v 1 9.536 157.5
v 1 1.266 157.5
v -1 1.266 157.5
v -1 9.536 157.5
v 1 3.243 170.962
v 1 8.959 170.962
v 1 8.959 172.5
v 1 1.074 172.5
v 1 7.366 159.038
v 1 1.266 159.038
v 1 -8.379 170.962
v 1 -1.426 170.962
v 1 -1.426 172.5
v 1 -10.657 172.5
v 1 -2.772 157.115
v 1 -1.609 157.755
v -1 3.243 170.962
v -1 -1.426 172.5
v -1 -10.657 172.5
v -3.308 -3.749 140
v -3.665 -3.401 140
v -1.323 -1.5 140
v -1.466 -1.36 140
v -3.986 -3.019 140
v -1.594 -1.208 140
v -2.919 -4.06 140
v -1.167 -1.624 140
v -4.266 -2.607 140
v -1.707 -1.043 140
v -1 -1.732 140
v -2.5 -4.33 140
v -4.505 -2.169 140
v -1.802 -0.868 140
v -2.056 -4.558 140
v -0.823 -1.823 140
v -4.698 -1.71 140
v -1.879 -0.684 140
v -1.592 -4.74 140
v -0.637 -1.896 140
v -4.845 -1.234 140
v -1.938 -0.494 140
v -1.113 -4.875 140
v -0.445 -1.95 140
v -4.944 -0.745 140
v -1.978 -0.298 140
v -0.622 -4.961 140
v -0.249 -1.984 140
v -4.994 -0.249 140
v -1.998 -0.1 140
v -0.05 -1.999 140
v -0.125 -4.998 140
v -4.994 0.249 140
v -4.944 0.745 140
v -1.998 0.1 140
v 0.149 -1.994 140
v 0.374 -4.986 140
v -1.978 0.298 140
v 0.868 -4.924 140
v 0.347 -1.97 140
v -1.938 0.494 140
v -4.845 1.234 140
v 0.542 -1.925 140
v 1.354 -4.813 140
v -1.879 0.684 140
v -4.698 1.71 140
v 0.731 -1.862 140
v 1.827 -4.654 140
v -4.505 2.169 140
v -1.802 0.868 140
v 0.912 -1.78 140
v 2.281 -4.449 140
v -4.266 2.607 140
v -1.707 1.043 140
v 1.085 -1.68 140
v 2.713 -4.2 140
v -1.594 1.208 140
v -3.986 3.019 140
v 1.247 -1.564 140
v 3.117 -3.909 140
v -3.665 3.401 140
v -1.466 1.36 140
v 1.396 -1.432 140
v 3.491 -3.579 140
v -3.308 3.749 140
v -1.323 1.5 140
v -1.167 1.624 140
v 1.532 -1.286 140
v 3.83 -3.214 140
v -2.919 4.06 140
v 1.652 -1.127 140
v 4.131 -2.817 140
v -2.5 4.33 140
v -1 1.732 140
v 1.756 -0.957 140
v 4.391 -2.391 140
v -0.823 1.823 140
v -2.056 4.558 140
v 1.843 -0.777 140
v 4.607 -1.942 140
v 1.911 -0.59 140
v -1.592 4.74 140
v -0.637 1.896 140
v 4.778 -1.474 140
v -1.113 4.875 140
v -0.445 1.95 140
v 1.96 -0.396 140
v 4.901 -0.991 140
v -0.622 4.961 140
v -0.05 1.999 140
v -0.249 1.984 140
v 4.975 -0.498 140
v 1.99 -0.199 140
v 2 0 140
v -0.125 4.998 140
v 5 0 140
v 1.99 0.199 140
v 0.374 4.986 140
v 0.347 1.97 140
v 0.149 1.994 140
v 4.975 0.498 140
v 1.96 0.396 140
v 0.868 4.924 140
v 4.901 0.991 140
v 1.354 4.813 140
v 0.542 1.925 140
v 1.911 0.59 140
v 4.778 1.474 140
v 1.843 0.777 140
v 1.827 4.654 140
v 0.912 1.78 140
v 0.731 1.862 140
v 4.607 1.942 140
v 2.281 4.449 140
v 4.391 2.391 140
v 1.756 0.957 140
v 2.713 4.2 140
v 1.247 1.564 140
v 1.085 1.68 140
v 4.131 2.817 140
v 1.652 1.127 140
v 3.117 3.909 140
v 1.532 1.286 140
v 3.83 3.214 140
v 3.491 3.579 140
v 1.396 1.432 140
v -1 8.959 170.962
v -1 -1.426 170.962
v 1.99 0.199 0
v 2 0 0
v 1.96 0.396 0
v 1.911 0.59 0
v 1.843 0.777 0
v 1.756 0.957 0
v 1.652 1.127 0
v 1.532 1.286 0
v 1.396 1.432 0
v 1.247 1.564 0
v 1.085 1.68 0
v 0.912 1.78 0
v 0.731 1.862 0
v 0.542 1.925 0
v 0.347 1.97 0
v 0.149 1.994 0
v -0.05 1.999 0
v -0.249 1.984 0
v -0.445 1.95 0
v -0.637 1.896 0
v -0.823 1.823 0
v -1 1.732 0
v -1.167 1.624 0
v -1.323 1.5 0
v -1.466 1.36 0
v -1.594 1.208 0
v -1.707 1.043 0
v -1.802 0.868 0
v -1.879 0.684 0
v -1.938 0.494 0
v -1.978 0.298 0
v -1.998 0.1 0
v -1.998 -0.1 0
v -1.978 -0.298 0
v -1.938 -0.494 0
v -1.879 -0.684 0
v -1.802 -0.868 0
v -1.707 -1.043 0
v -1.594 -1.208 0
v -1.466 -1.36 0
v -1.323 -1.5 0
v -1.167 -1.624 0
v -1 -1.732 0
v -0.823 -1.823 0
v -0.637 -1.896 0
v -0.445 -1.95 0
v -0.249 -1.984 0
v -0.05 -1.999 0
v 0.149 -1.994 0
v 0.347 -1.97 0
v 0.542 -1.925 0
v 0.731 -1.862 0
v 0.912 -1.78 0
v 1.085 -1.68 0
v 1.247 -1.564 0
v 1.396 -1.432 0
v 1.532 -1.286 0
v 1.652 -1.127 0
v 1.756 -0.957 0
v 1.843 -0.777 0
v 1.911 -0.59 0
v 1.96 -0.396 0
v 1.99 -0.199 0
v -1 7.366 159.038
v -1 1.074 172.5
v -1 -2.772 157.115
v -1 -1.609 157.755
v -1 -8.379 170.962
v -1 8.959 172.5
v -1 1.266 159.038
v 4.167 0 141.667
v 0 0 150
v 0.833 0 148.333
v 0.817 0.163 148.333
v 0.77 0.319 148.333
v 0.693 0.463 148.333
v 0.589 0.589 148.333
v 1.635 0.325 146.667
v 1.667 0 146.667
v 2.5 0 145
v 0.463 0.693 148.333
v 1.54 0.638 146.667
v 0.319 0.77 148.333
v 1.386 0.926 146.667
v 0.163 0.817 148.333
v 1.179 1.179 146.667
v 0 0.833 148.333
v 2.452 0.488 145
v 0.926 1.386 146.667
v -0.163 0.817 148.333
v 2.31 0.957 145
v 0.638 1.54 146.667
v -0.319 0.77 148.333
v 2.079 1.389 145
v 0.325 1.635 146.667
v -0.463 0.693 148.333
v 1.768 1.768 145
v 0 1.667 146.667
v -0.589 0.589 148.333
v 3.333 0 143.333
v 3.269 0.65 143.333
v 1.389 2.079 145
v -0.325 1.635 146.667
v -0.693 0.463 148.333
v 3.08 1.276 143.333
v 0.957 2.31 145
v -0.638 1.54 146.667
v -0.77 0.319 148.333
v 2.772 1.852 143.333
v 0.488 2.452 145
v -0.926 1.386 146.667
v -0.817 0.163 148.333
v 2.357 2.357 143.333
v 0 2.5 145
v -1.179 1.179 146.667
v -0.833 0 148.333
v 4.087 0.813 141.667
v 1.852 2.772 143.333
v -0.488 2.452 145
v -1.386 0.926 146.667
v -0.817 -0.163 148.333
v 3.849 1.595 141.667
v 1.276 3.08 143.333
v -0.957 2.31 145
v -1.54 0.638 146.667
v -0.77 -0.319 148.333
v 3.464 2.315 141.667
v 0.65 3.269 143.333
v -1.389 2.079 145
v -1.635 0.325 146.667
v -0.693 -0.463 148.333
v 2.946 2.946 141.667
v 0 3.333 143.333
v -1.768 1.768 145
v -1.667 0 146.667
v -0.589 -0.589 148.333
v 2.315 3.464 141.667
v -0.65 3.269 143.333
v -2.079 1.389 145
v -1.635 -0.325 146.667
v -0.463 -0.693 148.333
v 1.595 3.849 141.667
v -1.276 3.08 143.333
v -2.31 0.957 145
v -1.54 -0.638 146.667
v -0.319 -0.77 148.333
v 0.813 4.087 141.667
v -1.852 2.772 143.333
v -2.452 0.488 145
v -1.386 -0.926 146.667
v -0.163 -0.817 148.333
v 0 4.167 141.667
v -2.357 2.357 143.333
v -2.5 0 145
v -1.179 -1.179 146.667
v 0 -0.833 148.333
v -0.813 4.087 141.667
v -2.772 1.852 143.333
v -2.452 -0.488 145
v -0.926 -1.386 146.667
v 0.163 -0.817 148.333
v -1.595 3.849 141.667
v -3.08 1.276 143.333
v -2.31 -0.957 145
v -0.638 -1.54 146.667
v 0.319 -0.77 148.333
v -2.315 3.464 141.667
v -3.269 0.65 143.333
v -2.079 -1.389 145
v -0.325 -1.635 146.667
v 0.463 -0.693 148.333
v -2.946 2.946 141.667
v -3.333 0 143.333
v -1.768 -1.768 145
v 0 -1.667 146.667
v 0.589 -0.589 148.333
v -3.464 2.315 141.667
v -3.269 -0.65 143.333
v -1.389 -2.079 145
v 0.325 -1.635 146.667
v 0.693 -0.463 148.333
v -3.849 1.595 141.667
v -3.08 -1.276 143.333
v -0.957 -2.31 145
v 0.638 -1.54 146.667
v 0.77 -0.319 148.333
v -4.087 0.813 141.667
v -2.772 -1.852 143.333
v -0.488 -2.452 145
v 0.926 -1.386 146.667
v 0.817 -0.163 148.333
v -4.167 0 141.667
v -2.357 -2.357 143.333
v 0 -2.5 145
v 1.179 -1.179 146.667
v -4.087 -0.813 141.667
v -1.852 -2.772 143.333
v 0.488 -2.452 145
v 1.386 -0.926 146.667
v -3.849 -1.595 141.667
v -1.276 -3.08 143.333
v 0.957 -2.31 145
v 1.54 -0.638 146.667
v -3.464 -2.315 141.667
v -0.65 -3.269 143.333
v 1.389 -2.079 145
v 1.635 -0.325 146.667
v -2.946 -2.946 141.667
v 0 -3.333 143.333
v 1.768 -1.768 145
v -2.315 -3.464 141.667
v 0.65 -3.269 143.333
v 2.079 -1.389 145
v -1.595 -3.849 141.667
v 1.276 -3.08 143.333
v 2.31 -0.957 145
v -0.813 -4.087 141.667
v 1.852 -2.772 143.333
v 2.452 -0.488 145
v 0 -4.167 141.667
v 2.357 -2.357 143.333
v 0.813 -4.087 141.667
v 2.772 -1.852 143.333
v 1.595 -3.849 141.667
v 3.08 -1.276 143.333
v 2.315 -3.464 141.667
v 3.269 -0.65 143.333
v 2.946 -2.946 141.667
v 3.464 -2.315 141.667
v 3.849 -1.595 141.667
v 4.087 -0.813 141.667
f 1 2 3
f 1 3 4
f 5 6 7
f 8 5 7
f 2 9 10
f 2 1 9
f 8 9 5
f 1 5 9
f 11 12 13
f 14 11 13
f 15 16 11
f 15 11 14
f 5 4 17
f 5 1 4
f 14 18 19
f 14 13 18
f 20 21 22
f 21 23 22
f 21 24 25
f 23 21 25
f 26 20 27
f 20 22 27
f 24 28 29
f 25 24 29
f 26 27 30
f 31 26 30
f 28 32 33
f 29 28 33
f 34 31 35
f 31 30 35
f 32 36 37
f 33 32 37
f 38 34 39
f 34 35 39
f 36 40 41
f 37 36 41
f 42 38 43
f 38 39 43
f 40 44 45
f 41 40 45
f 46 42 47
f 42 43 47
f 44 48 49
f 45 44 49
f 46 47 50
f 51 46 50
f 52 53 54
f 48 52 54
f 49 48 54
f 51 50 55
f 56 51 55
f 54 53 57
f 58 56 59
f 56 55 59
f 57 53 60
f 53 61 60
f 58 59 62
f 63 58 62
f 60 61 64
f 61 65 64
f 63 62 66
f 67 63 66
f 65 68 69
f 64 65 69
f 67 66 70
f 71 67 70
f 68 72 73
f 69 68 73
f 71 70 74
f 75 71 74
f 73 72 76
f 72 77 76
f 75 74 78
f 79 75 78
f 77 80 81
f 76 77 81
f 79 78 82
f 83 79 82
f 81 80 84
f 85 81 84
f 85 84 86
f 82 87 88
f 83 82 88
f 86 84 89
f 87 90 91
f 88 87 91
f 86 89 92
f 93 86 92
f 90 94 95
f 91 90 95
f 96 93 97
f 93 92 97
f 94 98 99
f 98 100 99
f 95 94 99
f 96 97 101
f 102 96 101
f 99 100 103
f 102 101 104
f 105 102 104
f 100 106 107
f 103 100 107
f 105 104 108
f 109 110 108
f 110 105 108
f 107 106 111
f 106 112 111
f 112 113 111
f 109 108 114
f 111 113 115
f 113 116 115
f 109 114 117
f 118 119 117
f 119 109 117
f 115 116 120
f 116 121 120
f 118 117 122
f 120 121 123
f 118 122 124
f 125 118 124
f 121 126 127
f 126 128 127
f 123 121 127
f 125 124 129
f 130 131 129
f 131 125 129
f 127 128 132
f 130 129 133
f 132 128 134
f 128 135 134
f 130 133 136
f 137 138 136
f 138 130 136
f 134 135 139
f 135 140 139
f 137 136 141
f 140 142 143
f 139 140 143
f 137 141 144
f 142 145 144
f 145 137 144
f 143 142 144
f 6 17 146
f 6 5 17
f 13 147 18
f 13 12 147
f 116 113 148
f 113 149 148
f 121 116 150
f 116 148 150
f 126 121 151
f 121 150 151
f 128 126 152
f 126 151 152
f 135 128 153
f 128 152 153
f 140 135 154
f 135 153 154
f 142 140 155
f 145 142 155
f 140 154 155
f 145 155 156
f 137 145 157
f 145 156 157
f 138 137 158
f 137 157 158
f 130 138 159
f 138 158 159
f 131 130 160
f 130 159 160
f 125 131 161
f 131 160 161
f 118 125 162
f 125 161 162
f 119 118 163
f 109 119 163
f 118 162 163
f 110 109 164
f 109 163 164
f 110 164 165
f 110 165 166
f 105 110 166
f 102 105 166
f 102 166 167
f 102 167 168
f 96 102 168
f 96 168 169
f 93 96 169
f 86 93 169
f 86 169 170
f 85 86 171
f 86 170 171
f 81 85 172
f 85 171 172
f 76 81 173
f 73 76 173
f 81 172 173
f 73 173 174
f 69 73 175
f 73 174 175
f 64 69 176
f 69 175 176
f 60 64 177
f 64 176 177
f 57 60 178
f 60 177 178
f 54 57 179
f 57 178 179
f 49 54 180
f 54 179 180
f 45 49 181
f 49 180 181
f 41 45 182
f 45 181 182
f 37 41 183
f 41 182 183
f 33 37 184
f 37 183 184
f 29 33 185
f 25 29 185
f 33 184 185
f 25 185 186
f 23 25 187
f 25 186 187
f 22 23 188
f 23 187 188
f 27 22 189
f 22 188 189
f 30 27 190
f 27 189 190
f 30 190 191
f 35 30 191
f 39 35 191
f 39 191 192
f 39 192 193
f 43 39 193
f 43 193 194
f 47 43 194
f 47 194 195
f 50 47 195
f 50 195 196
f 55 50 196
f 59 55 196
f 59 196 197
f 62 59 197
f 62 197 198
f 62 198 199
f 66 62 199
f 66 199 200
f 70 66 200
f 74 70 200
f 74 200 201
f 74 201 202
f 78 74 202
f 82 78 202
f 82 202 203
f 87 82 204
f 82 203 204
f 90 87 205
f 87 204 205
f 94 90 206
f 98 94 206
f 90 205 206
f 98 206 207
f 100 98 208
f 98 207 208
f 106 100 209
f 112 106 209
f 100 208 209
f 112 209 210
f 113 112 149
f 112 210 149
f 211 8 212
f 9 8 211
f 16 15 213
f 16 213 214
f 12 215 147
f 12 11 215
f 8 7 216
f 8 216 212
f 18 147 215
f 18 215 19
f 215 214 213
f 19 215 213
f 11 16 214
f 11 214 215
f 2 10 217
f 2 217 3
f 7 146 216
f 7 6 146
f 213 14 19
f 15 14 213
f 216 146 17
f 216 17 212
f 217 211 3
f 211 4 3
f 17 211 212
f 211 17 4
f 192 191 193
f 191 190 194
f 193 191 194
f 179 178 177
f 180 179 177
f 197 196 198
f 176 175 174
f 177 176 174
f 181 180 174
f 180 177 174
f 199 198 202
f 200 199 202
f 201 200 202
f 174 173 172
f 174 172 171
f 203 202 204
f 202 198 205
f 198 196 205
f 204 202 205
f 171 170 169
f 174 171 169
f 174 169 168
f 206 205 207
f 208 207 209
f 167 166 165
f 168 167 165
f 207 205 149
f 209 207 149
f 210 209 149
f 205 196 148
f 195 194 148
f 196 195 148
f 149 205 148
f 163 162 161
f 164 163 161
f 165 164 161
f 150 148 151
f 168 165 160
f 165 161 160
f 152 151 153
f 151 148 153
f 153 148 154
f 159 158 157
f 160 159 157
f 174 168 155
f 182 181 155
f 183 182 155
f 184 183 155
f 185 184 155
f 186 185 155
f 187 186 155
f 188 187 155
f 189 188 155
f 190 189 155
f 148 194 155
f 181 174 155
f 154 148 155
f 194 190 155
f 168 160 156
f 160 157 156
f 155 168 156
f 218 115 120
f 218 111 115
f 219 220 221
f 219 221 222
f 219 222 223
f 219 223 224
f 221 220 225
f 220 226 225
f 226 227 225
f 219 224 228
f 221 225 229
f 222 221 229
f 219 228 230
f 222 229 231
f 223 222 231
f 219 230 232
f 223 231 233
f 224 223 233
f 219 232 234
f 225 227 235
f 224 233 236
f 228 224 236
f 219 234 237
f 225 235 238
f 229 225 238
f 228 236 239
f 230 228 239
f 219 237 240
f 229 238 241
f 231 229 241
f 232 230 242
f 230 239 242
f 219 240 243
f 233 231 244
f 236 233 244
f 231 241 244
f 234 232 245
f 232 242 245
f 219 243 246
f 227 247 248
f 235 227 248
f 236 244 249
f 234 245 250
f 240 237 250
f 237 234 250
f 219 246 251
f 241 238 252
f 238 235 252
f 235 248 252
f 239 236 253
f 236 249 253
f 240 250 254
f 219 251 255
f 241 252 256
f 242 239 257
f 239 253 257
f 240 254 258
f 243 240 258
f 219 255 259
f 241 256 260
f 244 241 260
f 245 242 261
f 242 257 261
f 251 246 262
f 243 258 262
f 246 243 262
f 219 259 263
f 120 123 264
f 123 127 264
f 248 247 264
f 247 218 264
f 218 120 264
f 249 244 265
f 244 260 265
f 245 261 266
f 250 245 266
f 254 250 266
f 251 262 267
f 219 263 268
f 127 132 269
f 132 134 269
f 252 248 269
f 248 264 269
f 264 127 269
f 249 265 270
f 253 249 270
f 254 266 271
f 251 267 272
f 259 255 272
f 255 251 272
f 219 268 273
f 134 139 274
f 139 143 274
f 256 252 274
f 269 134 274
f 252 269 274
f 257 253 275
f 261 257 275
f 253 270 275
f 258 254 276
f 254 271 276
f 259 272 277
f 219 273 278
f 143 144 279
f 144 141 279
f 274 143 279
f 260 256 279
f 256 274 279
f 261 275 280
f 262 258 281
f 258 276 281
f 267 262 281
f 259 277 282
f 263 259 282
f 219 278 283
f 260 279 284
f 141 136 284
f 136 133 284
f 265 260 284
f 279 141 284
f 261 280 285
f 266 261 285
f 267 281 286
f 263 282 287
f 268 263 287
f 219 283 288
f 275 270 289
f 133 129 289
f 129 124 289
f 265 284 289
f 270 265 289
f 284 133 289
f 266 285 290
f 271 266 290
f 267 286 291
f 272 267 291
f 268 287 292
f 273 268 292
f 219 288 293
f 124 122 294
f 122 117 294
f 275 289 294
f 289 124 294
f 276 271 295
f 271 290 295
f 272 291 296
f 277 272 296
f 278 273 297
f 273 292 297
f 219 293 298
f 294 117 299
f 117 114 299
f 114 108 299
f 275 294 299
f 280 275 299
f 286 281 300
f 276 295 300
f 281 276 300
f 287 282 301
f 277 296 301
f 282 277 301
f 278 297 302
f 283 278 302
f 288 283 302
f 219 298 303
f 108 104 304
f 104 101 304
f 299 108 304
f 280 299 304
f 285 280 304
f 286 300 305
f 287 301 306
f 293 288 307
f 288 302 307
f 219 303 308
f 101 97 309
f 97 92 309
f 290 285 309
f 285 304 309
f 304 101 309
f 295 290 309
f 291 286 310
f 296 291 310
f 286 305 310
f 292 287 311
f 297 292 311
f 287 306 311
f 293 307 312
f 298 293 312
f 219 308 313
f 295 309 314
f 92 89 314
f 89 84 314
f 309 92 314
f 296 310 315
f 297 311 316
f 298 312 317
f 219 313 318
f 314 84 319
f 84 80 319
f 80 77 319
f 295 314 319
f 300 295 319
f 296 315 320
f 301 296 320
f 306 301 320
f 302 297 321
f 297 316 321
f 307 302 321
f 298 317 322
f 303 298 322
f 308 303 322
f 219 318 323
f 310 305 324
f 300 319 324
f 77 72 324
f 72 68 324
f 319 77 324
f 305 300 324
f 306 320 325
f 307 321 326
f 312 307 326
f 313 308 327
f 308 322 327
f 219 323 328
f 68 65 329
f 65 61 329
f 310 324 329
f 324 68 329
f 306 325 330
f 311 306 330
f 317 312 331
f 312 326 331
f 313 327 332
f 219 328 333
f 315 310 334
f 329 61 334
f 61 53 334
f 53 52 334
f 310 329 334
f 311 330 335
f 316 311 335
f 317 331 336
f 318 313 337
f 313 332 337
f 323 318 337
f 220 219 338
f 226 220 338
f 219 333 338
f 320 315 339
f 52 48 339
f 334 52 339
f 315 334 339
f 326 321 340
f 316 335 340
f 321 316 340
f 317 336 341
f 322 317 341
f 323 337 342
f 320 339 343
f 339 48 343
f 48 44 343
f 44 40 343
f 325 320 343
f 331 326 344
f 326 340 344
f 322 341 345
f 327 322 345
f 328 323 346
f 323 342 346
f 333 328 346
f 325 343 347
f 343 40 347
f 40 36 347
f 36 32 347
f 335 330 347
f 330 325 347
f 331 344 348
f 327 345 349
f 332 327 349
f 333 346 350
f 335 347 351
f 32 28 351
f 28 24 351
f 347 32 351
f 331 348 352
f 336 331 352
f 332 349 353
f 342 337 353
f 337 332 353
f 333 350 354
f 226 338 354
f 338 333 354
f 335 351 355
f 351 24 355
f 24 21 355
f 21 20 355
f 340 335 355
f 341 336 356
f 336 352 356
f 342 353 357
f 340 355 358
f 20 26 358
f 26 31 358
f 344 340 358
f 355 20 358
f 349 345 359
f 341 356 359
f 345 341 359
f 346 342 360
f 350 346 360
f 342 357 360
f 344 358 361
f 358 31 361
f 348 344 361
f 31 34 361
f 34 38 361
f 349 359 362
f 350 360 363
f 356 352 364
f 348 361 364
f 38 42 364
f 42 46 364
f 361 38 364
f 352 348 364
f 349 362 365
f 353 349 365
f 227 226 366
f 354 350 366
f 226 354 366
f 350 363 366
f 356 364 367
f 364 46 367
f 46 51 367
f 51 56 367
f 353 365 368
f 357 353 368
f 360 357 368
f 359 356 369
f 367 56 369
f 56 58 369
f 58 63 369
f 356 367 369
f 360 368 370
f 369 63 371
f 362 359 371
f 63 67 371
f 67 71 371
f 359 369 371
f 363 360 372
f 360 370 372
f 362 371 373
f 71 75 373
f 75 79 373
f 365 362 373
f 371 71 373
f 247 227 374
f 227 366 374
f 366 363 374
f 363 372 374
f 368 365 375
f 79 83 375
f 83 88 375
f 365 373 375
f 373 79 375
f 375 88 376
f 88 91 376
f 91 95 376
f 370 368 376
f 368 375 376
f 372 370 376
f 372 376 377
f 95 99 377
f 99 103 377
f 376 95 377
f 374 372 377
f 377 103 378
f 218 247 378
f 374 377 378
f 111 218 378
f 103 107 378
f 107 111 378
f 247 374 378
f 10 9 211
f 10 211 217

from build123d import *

# Parameters (mm, degrees)
BOSS_EXTRUDE1_DEPTH        = 1
BOSS_EXTRUDE1_DEPTH_BACK   = 1
BOSS_EXTRUDE1_2_DEPTH      = 1
BOSS_EXTRUDE1_2_DEPTH_BACK = 1


with BuildPart() as part:
    # Sketch2 → Revolve1 (revolve)
    with BuildSketch(Plane(origin=(0, 0, 0), x_dir=(1, 0, 0), z_dir=(0, 1, 0))):
        Polygon((0, -150), (5, -140), (2, -140), (2, 0), (0, 0), align=None)
    revolve(axis=Axis((0, 0, -41.949952025), (0, 0, 1)))


with BuildPart() as body_2:
    # Sketch3 → Boss-Extrude1 (new, two sides: drawn at the far end of the back side and taken through both)
    with BuildSketch(Plane(origin=(0, 0, 0), x_dir=(0, -1, 0), z_dir=(1, 0, 0)).offset(-BOSS_EXTRUDE1_DEPTH_BACK)):
        Polygon((-8.958586521, -170.961538462), (-8.958586521, -172.5), (-1.073971137, -172.5), (-7.366038444, -159.038461538), (-1.266278829, -159.038461538), (-1.266278829, -157.5), (-9.535509598, -157.5), (-3.243442291, -170.961538462), align=None)
    extrude(amount=BOSS_EXTRUDE1_DEPTH + BOSS_EXTRUDE1_DEPTH_BACK)


with BuildPart() as body_3:
    # Sketch3 → Boss-Extrude1 2 (new, two sides: drawn at the far end of the back side and taken through both)
    with BuildSketch(Plane(origin=(0, 0, 0), x_dir=(0, -1, 0), z_dir=(1, 0, 0)).offset(-BOSS_EXTRUDE1_2_DEPTH_BACK)):
        Polygon((1.426028863, -172.5), (10.656798094, -172.5), (2.772182709, -157.115384615), (1.609322133, -157.755408654), (8.379153863, -170.961538462), (1.426028863, -170.961538462), align=None)
    extrude(amount=BOSS_EXTRUDE1_2_DEPTH + BOSS_EXTRUDE1_2_DEPTH_BACK)


solid = Compound([part.part, body_2.part, body_3.part])
